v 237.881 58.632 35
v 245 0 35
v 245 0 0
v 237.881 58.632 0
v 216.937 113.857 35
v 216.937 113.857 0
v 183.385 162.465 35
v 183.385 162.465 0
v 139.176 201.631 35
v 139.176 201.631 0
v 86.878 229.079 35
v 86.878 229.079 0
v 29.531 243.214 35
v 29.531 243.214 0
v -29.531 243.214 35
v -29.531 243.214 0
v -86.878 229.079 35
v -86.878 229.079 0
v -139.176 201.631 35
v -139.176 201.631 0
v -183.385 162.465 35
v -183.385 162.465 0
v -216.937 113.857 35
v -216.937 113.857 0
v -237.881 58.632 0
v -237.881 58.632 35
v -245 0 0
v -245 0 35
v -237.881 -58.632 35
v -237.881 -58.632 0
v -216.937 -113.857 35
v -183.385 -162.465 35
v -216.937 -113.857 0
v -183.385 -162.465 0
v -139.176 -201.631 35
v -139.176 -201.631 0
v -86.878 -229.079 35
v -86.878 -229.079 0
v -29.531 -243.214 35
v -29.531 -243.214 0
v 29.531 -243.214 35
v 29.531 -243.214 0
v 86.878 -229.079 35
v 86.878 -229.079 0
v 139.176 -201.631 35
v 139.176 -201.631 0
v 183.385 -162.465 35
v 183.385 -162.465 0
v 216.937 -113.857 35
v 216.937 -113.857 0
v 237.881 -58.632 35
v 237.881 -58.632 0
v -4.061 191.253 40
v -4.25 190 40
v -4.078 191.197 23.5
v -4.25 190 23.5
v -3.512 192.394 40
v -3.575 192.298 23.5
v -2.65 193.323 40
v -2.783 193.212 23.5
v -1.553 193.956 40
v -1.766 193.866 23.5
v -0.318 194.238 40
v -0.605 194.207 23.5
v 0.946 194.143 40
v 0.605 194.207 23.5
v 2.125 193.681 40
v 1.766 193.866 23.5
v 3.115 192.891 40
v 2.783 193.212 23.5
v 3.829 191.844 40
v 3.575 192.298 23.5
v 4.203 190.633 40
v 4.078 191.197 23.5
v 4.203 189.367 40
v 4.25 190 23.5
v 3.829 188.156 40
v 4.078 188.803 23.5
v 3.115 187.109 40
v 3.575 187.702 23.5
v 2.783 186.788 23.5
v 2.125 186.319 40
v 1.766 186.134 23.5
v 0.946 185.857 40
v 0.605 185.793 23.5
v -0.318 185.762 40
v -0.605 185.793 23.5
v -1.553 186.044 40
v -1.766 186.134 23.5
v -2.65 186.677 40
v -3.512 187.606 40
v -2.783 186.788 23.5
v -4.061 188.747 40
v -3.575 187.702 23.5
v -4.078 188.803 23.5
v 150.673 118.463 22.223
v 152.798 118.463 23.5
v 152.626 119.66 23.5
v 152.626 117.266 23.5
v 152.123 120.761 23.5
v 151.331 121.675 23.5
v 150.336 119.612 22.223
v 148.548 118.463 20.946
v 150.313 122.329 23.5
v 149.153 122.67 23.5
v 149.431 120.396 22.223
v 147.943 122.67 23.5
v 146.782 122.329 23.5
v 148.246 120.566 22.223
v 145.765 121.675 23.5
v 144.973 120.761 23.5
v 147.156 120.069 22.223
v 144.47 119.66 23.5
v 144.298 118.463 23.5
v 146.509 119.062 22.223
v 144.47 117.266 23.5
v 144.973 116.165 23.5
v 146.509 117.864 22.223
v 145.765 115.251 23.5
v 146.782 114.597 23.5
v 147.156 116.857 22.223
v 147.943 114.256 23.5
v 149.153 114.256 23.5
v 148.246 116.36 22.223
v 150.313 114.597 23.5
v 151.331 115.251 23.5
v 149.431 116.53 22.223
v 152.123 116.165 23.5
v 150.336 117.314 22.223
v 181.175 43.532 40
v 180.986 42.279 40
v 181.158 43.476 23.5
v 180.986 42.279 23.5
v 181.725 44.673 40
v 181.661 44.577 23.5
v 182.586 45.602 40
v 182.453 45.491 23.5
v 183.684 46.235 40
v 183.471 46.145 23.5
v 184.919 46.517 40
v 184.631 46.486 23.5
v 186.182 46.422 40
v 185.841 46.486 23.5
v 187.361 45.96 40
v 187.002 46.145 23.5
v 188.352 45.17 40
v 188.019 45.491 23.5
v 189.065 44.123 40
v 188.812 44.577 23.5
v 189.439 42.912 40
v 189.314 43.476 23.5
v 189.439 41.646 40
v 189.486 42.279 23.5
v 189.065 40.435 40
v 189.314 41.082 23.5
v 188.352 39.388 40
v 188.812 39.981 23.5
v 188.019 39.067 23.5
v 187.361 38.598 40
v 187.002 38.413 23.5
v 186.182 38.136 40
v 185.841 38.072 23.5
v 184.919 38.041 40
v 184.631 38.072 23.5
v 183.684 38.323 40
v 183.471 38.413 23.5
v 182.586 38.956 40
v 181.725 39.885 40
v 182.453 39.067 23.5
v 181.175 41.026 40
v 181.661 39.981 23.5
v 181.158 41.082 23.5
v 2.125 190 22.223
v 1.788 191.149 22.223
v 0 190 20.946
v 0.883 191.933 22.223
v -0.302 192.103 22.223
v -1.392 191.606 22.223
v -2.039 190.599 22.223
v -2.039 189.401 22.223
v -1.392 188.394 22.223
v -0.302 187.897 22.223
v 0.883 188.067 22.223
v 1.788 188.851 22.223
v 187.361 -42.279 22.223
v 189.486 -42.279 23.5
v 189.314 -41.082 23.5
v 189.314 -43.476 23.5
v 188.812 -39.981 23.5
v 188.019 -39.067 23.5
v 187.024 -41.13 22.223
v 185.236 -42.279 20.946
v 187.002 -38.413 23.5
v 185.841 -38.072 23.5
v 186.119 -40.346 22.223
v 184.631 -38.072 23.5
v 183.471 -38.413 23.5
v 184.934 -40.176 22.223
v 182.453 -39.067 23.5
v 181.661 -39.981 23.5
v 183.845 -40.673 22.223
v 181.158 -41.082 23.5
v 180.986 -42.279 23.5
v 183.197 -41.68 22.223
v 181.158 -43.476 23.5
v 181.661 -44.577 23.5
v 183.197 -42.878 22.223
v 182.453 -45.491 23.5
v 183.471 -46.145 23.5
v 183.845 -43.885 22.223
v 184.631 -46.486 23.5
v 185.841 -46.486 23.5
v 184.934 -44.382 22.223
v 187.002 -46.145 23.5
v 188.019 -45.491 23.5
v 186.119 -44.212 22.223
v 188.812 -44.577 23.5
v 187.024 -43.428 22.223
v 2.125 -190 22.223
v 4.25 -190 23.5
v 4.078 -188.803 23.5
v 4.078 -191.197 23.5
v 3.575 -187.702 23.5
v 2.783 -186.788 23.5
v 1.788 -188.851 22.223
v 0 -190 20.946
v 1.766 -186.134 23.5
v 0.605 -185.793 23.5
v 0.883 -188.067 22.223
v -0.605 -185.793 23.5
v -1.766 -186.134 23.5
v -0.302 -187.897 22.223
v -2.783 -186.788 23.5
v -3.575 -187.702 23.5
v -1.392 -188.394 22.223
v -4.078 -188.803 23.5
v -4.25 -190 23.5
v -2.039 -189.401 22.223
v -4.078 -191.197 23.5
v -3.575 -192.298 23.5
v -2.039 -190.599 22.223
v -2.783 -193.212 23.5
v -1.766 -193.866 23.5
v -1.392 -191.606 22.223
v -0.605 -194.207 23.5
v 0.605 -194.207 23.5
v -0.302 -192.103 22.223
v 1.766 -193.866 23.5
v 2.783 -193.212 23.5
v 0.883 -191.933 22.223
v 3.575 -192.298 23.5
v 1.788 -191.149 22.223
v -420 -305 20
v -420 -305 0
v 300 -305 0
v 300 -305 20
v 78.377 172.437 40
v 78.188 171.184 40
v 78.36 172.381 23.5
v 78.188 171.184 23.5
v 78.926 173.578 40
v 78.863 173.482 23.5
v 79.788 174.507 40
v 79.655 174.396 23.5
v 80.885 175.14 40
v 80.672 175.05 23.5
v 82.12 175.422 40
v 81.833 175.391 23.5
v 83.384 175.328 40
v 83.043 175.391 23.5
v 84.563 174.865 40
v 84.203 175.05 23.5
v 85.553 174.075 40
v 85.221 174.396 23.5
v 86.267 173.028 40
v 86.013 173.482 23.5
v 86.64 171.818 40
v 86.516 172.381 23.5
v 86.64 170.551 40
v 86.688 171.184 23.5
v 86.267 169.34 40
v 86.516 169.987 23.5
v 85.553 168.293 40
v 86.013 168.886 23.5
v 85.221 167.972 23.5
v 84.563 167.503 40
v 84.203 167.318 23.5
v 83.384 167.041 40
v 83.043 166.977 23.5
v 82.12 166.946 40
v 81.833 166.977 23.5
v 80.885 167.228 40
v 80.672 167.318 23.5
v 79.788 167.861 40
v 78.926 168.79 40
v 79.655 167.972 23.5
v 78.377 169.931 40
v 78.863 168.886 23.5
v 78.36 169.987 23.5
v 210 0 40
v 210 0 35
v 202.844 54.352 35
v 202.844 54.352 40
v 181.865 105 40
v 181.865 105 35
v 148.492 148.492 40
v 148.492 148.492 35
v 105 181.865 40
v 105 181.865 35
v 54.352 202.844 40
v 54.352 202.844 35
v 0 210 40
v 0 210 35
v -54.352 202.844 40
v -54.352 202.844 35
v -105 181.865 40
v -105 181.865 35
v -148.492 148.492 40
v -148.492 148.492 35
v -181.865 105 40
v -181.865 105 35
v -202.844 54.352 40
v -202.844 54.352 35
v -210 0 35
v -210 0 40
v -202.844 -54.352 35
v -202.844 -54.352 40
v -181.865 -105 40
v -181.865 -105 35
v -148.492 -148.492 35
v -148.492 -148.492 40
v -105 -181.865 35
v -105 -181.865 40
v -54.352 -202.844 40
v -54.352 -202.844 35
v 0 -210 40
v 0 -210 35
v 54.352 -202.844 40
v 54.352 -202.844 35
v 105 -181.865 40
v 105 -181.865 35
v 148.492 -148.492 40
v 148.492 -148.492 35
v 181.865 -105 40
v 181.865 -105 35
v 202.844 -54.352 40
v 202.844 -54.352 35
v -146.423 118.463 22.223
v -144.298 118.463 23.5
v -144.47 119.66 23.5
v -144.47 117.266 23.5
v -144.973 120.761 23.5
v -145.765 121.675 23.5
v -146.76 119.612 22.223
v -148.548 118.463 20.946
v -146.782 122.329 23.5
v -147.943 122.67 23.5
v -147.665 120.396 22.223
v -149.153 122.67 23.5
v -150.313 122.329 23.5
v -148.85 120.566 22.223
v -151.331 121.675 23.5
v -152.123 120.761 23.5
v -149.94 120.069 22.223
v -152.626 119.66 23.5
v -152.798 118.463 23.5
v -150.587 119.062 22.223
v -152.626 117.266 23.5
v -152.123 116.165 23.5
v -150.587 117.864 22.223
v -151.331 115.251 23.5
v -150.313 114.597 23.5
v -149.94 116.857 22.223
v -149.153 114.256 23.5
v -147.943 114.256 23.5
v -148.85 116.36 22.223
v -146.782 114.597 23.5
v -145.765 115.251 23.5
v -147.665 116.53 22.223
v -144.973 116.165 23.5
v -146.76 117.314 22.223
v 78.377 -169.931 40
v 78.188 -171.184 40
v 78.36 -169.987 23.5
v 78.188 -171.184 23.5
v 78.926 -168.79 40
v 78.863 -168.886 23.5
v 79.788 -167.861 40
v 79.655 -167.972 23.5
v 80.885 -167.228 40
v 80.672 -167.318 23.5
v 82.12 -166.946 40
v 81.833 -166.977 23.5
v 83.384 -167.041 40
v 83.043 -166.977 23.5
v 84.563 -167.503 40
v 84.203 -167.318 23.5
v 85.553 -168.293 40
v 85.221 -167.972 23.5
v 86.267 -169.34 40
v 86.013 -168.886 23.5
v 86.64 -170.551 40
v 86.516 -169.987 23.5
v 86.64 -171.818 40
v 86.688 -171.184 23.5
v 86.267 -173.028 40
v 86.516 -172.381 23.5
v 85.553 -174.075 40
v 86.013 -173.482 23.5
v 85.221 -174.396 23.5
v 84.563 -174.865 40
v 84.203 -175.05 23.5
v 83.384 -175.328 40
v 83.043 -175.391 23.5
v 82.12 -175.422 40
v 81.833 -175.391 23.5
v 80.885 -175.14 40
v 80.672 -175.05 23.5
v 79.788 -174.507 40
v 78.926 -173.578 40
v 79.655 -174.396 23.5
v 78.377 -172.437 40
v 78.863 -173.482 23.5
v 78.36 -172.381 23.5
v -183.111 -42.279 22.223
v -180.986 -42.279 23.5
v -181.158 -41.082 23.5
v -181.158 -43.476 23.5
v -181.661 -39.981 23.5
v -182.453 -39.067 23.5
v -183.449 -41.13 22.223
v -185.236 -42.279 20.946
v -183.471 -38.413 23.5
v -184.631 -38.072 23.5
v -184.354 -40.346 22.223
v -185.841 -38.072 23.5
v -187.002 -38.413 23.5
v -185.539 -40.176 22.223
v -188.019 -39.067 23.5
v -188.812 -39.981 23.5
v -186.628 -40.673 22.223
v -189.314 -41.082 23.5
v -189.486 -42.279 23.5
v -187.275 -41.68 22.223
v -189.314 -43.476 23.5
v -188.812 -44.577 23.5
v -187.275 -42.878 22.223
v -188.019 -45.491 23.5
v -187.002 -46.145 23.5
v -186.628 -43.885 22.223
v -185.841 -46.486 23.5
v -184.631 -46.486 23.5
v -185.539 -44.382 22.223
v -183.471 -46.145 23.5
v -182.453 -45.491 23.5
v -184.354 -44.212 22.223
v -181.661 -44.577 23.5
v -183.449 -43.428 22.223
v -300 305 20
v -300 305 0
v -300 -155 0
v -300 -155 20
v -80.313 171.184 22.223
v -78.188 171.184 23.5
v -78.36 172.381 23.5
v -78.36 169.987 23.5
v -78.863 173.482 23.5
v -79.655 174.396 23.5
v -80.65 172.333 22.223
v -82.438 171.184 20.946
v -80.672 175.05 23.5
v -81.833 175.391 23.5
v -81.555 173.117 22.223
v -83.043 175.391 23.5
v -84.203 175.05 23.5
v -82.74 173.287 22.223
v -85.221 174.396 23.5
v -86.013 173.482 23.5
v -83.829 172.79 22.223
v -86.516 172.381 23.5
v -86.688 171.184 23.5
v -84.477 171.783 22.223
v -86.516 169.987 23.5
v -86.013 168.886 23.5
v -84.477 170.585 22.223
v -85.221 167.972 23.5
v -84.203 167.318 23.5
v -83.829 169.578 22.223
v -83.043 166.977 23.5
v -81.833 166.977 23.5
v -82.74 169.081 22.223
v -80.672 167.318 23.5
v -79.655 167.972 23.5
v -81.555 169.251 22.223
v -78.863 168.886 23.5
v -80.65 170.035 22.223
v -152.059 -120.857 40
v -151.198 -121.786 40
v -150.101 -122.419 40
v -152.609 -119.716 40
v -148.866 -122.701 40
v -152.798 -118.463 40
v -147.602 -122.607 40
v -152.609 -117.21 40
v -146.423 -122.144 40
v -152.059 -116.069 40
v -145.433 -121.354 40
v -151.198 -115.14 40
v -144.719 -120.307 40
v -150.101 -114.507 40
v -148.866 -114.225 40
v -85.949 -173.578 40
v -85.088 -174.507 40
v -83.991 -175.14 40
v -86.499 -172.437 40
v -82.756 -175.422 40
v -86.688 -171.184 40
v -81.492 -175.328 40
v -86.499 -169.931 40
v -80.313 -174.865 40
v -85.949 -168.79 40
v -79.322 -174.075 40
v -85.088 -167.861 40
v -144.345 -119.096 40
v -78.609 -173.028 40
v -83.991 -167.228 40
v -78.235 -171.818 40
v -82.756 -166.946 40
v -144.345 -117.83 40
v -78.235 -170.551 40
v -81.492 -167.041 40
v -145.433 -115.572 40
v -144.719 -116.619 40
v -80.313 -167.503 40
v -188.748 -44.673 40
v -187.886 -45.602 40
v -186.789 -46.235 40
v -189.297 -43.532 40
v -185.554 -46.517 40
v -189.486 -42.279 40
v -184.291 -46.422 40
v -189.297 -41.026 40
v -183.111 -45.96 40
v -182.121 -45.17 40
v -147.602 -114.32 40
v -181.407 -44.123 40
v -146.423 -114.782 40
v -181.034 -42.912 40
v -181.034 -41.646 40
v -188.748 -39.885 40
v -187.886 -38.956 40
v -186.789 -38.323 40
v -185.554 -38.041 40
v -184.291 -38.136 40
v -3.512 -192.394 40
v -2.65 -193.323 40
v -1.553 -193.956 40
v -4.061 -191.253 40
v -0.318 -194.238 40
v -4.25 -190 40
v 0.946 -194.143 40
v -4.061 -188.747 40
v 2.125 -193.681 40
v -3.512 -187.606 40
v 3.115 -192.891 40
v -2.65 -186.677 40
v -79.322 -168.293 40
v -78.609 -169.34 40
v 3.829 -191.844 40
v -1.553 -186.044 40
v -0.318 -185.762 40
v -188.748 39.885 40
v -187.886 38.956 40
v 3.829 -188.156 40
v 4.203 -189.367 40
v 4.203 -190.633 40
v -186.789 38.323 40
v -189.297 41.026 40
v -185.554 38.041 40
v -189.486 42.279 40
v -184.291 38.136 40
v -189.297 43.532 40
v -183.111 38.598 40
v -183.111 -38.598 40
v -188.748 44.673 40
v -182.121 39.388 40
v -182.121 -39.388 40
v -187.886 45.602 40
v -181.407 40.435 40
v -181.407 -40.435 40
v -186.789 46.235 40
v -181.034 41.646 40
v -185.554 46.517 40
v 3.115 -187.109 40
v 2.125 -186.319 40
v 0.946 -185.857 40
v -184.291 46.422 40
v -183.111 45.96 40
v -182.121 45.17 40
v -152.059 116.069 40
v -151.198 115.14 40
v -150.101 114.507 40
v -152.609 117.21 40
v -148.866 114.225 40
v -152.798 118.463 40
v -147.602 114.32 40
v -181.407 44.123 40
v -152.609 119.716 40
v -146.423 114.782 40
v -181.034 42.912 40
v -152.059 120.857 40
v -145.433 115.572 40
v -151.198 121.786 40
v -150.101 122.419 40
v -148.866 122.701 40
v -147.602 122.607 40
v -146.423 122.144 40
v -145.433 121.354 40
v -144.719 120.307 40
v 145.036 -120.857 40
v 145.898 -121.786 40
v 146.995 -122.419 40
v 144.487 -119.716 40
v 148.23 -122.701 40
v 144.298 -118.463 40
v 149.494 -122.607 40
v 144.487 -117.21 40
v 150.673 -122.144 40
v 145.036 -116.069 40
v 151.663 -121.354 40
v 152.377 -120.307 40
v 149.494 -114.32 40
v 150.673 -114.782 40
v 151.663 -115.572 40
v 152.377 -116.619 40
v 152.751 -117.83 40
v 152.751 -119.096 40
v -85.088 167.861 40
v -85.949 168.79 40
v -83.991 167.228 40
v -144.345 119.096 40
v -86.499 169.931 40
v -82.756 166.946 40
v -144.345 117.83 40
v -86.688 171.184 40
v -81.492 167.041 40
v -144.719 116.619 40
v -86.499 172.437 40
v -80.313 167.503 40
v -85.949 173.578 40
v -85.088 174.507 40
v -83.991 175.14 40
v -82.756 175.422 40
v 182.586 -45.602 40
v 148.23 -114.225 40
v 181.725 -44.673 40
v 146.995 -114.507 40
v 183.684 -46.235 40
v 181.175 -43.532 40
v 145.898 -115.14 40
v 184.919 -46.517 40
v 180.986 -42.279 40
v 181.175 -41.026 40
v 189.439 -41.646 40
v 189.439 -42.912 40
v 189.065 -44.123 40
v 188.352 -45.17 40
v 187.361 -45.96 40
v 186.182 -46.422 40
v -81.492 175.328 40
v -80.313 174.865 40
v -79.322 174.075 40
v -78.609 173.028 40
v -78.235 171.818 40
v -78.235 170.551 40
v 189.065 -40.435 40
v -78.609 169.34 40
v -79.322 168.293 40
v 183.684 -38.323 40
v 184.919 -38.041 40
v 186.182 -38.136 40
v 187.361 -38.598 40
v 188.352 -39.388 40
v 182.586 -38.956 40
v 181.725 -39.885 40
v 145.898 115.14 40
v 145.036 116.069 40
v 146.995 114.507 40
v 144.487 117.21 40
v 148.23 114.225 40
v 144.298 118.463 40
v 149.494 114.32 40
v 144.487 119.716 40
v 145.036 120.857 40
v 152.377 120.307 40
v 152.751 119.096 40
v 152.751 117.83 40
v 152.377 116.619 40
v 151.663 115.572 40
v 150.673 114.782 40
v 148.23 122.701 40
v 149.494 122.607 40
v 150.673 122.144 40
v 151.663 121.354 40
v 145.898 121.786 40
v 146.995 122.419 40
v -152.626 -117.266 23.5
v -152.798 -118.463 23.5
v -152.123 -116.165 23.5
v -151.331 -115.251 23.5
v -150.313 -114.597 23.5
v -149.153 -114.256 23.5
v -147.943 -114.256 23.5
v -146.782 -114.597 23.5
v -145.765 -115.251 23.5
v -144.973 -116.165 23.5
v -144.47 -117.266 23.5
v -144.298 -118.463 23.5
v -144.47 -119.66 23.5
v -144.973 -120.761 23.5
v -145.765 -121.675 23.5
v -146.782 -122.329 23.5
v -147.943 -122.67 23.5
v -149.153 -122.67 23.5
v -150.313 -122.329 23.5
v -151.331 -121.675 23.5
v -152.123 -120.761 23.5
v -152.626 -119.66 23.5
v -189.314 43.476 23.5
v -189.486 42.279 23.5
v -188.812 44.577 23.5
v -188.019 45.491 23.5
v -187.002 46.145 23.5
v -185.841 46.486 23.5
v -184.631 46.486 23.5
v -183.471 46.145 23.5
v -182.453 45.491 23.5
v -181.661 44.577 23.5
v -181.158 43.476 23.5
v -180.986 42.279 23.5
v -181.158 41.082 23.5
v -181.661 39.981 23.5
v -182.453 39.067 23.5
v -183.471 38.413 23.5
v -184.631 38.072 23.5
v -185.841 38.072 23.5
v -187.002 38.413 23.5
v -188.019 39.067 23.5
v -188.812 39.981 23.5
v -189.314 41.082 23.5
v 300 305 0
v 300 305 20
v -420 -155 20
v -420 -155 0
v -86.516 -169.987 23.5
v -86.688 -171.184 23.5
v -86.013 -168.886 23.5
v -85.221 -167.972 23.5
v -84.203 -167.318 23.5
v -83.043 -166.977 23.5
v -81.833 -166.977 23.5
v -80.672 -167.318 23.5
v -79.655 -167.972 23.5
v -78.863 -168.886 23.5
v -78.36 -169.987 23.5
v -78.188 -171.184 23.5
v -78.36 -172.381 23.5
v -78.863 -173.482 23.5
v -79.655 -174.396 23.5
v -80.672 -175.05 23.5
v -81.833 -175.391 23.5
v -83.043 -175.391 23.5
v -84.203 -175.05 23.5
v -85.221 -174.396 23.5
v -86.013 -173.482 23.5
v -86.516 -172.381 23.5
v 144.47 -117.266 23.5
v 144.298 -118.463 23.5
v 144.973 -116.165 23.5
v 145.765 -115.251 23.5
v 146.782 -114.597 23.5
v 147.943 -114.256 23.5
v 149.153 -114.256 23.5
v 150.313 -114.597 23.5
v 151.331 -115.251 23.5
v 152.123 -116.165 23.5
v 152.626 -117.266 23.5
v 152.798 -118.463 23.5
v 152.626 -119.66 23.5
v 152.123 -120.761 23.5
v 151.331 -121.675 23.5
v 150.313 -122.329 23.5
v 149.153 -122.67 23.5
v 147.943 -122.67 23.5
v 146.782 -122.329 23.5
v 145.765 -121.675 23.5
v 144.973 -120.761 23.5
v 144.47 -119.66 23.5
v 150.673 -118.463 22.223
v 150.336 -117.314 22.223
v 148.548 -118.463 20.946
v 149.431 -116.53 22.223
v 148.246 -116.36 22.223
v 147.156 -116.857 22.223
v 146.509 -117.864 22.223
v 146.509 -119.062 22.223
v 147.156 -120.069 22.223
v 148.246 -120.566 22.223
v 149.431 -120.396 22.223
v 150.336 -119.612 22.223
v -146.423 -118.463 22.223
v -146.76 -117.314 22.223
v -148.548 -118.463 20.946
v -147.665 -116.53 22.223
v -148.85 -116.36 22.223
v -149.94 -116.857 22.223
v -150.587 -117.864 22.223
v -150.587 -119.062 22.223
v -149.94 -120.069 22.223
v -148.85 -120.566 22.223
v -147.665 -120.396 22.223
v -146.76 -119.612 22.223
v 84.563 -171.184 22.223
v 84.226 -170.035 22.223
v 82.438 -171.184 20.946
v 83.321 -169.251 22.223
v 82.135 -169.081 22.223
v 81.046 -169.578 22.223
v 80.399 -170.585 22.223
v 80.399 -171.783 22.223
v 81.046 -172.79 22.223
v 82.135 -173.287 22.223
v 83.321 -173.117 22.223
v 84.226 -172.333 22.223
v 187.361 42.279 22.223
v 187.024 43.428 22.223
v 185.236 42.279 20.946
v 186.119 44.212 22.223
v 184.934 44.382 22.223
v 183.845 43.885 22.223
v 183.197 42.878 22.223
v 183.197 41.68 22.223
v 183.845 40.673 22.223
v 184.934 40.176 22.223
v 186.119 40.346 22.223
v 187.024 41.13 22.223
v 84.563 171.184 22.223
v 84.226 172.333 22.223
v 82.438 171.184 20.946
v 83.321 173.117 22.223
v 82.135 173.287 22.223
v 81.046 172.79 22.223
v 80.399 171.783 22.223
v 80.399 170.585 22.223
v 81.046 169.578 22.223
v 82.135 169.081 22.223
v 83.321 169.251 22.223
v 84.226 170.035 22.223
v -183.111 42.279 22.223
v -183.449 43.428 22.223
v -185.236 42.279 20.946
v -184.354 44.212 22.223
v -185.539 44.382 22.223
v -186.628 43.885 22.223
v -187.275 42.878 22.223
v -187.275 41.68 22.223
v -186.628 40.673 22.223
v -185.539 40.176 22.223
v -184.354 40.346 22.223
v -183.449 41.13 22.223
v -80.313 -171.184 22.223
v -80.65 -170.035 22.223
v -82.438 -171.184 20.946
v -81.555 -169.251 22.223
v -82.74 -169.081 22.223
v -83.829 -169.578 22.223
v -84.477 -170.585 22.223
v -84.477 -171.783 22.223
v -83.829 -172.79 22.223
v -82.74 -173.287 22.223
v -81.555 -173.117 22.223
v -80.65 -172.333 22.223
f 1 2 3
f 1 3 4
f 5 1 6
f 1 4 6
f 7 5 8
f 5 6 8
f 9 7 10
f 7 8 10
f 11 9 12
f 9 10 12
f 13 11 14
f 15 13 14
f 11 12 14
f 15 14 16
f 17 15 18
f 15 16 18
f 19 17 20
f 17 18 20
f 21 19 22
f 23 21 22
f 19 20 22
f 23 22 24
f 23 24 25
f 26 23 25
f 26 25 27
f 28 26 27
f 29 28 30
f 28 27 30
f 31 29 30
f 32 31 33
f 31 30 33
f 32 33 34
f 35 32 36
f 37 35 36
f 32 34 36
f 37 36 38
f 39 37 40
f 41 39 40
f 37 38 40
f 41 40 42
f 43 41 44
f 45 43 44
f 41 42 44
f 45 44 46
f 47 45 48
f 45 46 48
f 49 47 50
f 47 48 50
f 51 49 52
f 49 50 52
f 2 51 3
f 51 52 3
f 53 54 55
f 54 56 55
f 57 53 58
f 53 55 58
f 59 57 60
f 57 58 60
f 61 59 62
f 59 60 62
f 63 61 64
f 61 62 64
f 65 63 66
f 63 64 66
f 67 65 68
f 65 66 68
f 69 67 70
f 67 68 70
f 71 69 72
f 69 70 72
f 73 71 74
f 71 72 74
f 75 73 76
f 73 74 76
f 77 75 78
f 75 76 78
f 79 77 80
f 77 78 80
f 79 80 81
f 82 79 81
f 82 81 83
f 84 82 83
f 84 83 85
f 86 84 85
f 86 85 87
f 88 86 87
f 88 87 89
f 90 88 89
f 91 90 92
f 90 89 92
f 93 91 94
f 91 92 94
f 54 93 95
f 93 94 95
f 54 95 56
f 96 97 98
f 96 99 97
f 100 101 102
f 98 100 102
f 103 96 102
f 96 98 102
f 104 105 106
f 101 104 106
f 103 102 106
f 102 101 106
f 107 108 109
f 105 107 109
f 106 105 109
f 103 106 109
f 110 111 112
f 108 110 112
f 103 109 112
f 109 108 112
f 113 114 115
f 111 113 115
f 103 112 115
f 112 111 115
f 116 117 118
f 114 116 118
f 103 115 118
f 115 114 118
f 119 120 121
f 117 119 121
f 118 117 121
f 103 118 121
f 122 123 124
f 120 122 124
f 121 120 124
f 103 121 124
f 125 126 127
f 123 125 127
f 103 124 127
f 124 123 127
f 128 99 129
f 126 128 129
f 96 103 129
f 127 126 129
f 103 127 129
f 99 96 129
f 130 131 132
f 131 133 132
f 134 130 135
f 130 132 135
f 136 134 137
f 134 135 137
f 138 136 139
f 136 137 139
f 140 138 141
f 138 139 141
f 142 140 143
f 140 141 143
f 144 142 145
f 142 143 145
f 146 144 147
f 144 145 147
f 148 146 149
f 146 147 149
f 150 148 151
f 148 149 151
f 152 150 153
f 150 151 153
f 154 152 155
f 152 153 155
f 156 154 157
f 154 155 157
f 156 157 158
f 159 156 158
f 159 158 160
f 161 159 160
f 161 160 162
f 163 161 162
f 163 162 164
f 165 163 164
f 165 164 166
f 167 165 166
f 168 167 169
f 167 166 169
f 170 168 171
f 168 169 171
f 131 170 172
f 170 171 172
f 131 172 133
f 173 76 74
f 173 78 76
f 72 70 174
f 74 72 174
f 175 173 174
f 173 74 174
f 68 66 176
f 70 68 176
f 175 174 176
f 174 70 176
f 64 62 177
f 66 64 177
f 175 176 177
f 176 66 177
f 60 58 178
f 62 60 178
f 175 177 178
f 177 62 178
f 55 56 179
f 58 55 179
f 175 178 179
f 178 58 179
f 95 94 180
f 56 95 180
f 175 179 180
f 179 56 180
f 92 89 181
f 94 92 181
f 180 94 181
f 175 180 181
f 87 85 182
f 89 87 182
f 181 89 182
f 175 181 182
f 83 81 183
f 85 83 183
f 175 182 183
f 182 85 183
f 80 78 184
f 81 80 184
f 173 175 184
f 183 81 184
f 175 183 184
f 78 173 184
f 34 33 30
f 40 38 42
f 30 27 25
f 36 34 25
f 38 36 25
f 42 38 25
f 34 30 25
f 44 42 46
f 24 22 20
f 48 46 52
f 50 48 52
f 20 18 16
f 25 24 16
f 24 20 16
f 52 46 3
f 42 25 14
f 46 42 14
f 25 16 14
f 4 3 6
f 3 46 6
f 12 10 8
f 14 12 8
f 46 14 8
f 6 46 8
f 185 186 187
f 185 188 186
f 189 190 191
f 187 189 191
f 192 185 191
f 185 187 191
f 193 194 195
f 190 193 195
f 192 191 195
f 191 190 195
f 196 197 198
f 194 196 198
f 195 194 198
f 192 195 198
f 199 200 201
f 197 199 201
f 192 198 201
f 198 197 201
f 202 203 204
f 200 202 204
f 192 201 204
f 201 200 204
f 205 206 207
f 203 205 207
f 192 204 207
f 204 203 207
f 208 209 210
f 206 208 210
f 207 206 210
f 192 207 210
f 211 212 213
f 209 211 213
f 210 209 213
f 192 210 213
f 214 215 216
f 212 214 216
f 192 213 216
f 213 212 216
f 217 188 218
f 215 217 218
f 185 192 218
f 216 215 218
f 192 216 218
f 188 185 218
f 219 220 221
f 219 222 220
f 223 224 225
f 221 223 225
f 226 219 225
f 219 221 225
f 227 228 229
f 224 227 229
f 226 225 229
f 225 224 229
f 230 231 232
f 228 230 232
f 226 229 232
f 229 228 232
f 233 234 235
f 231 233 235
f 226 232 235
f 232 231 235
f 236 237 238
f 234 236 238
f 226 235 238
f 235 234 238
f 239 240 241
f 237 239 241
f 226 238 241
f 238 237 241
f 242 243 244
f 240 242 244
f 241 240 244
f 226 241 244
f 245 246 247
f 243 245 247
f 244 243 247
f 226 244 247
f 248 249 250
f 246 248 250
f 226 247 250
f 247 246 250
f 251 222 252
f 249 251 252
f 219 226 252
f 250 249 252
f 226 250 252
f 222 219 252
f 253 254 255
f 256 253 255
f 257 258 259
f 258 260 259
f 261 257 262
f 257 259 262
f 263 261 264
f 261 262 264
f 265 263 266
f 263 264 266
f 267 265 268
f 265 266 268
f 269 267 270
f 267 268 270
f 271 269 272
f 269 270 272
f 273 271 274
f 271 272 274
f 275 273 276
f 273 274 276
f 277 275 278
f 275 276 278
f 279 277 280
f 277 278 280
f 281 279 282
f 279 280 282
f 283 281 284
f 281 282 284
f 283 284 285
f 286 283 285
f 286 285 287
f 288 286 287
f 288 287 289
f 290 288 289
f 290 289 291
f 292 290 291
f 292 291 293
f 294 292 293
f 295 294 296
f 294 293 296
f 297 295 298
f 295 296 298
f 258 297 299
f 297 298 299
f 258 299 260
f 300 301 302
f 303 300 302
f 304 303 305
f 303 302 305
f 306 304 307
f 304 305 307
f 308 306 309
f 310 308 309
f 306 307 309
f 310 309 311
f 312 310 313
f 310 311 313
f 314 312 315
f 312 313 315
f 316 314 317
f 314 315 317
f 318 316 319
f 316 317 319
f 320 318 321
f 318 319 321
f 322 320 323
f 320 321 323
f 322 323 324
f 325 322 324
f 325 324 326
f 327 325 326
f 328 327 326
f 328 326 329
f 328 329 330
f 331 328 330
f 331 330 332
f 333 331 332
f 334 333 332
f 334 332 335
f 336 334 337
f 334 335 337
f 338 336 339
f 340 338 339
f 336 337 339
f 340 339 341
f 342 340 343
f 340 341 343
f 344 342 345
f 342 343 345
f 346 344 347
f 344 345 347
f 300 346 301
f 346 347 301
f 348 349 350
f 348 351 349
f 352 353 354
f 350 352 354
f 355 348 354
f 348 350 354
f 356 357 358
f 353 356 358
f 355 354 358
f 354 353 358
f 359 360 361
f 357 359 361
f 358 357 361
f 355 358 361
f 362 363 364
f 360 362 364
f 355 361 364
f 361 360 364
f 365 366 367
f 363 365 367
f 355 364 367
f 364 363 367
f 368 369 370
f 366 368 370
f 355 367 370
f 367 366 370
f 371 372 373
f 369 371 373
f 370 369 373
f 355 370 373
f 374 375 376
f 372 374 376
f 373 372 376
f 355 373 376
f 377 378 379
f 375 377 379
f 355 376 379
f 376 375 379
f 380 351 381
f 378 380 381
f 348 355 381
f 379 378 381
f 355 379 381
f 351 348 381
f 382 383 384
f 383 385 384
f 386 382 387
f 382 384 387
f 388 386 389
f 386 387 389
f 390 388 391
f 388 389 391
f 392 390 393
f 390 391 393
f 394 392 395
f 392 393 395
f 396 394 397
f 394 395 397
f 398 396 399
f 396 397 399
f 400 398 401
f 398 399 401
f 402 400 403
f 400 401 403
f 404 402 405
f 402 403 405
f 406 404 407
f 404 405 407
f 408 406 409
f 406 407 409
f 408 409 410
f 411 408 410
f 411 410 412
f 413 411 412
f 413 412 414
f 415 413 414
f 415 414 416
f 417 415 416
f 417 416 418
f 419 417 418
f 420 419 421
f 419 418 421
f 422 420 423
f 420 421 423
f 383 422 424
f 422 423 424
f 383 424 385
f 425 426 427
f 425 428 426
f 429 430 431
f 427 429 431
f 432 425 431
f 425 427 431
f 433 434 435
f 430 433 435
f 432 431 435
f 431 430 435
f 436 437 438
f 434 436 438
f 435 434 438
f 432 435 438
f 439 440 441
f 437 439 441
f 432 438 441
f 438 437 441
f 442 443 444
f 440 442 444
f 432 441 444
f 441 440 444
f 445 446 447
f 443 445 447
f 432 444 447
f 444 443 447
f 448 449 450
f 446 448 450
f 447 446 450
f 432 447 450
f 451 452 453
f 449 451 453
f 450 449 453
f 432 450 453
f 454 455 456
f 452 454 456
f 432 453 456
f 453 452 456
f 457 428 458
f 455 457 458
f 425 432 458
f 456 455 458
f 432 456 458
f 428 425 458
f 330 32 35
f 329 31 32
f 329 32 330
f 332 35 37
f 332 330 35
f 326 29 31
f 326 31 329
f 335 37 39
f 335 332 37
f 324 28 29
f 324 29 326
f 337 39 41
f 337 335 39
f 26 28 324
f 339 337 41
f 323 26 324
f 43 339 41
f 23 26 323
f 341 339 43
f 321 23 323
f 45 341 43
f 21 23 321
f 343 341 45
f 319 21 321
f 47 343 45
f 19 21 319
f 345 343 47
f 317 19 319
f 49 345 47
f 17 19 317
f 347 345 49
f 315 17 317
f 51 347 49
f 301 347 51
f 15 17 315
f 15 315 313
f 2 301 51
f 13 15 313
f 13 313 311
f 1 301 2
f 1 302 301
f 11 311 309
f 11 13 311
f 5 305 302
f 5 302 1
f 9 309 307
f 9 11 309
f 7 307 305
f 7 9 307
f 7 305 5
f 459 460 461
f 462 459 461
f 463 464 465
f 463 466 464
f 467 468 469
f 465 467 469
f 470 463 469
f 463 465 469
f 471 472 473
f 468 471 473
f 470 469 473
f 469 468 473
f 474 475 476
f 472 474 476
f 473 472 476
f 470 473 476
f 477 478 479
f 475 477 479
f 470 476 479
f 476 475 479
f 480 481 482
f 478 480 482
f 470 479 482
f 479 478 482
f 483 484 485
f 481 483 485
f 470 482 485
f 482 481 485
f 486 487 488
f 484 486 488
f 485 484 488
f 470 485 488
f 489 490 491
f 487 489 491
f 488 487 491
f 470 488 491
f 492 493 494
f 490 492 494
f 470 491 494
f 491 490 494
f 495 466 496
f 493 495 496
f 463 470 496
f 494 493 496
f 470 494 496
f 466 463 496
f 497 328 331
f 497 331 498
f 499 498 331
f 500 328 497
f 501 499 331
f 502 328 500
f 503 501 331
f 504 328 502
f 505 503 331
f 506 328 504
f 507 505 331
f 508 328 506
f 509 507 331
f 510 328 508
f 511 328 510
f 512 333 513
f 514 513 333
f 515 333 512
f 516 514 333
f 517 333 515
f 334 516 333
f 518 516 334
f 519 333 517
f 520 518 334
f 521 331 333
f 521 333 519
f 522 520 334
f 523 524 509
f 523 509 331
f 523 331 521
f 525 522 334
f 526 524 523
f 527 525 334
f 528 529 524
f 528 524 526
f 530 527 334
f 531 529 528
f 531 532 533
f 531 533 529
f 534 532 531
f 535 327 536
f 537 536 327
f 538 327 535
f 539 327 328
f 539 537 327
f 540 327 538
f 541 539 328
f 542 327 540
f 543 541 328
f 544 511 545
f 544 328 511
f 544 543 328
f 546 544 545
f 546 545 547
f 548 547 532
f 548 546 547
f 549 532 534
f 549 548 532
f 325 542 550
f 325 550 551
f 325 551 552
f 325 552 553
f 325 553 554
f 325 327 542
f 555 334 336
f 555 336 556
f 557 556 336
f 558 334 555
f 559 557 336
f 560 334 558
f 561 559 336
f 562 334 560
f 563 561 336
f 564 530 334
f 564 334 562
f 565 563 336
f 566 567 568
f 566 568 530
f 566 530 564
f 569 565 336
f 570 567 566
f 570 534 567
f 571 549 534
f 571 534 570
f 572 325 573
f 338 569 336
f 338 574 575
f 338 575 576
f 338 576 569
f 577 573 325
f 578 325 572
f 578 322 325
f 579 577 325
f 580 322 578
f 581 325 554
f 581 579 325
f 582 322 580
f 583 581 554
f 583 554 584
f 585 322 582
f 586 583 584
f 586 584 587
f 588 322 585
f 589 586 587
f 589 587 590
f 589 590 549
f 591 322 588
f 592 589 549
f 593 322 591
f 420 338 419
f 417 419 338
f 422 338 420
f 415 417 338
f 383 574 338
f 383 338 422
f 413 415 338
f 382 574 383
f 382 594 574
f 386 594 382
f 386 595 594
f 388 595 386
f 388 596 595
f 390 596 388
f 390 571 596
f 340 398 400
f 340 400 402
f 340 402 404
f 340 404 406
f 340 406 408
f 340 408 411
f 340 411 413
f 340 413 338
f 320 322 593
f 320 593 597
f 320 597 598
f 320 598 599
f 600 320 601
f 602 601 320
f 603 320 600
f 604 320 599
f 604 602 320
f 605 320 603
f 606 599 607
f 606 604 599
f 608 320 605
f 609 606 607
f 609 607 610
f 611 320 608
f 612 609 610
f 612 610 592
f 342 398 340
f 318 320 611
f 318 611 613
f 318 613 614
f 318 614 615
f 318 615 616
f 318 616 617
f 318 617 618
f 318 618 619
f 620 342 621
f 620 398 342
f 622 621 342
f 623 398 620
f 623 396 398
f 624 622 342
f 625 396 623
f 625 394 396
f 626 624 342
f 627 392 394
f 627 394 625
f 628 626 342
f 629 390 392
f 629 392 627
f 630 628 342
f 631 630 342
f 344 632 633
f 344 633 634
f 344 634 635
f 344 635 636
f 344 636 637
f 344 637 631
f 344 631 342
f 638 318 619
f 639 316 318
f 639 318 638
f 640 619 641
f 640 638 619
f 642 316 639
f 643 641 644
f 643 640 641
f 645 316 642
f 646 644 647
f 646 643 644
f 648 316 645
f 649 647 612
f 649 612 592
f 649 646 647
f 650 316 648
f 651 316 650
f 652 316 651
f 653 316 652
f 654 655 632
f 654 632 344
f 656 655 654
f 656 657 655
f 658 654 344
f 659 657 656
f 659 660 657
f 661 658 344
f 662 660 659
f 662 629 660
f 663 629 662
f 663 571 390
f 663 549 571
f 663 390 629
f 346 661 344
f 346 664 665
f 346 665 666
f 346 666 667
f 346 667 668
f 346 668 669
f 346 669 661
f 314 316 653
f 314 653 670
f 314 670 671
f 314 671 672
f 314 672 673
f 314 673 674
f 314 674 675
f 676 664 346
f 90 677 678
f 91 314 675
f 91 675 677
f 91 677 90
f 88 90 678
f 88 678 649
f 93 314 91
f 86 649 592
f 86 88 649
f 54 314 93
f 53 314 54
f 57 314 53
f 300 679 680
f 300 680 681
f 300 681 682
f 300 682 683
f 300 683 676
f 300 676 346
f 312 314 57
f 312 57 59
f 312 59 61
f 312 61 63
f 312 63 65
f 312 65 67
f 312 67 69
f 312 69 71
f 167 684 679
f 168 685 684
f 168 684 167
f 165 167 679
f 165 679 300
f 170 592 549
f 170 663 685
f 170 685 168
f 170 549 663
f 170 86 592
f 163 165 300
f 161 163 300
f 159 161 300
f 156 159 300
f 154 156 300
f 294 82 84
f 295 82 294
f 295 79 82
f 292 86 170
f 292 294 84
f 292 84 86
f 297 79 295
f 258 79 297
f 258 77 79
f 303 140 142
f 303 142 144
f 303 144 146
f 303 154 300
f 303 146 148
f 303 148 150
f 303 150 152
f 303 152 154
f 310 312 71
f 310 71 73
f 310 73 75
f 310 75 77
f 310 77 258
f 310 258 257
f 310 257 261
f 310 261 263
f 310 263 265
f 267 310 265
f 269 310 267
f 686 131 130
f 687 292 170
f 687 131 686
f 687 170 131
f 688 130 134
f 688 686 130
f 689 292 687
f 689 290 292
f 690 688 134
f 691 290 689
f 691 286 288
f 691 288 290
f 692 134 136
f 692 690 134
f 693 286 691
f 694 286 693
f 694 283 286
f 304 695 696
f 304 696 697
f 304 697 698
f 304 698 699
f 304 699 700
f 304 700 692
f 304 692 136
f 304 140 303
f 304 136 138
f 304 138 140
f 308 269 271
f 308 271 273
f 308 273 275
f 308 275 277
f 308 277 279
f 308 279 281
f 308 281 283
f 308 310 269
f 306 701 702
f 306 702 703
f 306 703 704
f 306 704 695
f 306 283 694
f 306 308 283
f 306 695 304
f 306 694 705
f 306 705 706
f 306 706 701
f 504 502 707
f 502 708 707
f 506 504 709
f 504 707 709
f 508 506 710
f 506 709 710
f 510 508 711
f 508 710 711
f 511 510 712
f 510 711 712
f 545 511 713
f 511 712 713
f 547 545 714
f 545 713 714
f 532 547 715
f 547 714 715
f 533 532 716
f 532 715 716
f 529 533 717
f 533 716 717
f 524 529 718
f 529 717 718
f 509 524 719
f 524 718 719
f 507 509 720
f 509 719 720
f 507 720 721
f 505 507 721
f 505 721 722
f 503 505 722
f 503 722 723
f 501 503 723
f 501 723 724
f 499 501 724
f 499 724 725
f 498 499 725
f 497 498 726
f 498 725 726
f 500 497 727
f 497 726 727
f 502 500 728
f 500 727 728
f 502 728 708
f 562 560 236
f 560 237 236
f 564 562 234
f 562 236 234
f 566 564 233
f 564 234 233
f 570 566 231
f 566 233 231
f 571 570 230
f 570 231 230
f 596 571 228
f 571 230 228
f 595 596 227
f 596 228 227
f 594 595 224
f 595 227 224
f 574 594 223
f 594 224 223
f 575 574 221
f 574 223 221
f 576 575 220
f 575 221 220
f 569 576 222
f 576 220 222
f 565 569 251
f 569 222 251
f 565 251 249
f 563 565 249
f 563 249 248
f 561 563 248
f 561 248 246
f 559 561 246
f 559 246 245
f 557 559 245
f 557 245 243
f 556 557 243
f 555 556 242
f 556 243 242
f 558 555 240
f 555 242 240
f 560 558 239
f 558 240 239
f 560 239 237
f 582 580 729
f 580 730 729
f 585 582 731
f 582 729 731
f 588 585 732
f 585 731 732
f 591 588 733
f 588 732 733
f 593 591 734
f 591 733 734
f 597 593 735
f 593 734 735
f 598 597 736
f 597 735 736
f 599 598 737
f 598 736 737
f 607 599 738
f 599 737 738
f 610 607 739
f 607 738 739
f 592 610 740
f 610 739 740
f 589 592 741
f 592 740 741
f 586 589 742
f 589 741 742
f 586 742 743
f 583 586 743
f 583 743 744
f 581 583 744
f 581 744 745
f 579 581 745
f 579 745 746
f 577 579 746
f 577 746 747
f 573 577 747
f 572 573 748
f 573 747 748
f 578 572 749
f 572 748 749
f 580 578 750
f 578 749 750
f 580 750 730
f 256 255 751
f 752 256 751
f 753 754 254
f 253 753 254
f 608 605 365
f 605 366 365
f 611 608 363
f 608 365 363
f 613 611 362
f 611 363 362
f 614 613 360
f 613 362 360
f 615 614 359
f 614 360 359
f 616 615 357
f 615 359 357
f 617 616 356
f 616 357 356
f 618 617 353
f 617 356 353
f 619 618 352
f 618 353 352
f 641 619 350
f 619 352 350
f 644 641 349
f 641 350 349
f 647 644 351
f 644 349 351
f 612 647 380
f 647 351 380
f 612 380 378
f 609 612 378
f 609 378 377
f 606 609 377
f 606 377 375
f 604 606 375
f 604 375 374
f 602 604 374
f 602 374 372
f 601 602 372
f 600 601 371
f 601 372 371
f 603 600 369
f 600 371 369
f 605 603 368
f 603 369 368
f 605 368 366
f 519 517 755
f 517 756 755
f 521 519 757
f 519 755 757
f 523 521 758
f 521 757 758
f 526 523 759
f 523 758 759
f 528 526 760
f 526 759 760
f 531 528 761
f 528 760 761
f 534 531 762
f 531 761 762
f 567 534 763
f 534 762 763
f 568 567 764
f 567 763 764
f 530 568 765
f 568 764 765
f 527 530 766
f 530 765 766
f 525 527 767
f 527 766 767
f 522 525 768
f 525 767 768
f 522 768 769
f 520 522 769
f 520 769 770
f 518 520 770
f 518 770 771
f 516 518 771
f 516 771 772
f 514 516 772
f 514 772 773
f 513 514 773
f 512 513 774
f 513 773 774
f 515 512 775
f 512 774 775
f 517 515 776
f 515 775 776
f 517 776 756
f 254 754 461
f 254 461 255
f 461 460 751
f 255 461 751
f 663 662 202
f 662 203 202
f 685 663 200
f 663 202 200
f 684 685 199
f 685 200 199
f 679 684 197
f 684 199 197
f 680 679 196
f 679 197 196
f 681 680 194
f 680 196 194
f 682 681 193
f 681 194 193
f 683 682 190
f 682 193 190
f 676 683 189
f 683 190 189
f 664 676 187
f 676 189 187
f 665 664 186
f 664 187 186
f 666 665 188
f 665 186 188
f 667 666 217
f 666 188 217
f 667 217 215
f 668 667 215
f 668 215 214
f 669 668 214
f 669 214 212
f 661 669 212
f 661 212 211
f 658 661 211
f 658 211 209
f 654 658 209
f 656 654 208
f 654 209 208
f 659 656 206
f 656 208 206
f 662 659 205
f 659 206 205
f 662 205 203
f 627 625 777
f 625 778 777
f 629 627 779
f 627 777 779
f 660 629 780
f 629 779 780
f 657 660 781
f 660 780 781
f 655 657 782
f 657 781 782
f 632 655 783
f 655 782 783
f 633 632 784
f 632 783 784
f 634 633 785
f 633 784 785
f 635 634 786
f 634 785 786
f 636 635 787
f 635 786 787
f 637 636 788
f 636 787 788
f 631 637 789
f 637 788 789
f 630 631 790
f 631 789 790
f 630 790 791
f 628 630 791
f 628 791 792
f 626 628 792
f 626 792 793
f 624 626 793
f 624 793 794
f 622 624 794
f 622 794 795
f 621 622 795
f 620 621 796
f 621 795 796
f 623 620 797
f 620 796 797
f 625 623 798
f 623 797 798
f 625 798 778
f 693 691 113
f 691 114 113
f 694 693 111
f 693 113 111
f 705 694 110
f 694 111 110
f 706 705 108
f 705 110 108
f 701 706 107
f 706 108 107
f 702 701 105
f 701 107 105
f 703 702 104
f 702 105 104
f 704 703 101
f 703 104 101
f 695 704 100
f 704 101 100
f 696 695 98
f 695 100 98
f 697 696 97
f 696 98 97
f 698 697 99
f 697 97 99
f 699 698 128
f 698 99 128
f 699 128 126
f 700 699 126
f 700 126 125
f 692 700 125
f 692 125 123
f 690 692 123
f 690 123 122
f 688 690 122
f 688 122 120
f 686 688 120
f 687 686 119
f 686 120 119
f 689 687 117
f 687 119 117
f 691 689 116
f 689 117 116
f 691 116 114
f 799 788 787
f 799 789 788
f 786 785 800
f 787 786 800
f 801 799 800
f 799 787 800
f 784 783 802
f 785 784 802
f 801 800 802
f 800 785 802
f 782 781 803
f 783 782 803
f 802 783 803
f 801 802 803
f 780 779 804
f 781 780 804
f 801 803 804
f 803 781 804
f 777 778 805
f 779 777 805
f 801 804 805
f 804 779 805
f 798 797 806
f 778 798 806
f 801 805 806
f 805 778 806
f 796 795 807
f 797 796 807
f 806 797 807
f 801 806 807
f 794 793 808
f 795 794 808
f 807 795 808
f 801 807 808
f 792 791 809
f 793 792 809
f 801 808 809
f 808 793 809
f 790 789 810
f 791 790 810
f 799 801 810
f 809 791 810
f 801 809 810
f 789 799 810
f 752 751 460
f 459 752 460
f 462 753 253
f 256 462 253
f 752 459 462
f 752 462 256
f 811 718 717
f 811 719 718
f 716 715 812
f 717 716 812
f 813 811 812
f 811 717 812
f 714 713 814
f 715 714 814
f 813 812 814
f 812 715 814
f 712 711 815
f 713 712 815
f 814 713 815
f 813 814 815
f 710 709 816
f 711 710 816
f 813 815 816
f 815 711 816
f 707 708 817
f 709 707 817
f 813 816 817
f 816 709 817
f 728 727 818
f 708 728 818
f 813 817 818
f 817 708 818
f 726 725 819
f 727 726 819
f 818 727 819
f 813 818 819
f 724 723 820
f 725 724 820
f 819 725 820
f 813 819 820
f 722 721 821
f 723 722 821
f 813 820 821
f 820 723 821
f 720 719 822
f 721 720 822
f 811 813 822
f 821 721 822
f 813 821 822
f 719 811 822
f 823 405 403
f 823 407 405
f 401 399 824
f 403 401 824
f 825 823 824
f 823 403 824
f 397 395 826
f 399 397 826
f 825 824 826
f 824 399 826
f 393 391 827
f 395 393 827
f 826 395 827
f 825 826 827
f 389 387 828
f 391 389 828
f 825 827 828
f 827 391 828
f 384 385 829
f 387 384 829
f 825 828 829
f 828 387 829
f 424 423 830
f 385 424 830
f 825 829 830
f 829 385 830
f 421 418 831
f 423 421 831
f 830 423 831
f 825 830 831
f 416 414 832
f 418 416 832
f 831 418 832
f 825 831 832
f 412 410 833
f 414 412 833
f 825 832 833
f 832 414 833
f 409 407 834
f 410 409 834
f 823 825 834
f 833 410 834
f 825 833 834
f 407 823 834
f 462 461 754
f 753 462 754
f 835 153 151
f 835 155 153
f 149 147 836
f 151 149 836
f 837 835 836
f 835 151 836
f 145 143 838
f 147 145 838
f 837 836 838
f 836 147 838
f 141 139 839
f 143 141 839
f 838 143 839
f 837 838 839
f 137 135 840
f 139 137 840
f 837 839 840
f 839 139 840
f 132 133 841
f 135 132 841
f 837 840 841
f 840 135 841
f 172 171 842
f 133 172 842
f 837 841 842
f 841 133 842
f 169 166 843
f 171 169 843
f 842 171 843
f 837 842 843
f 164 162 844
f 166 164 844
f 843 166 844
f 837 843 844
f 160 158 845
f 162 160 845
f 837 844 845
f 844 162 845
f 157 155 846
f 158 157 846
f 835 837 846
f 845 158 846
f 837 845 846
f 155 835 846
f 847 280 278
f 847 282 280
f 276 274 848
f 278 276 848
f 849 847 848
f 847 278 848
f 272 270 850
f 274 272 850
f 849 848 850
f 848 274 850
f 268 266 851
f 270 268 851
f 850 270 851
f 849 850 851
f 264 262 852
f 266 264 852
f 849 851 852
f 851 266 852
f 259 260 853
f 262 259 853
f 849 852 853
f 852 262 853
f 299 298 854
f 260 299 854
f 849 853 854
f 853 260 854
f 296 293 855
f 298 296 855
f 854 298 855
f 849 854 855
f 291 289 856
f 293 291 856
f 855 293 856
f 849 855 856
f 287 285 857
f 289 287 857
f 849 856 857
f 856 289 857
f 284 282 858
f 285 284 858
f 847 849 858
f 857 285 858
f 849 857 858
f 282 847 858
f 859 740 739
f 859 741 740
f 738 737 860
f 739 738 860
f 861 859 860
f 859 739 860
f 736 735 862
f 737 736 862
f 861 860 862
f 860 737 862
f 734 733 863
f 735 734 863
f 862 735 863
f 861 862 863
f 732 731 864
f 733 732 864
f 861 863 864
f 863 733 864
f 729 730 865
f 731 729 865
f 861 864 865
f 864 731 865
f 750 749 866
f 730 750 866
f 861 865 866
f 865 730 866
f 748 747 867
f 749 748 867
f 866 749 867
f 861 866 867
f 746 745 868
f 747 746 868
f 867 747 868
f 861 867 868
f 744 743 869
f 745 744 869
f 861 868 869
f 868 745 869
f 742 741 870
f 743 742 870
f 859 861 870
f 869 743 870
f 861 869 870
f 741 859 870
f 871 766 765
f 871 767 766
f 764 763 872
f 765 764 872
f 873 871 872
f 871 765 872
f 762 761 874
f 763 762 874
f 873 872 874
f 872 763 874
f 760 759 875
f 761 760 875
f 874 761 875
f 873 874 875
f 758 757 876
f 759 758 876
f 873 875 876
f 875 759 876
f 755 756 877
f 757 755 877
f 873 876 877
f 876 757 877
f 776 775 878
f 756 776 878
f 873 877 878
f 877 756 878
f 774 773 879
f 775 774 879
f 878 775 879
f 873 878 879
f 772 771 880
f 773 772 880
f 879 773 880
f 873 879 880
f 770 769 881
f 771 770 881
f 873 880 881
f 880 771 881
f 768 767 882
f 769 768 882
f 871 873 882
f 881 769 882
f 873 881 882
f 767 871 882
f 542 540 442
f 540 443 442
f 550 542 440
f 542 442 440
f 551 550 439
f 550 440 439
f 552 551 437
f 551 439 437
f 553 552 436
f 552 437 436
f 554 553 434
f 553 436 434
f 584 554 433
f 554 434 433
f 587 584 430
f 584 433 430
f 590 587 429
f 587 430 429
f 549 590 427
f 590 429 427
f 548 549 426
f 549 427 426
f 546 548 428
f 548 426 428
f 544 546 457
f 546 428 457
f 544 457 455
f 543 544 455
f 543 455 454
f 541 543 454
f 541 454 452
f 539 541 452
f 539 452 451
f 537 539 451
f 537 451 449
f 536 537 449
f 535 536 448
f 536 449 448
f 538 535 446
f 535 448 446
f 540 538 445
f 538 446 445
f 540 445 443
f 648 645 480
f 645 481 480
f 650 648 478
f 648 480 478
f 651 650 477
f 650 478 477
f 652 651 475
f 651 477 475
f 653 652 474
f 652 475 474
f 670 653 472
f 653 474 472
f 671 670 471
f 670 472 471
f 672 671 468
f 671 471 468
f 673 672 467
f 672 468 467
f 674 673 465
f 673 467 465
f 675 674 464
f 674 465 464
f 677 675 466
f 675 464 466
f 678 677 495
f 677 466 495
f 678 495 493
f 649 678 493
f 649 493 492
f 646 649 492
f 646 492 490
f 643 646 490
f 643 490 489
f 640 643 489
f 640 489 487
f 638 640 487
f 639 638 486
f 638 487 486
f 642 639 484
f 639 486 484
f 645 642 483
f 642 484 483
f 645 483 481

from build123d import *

# Parameters (mm, degrees)
F1_DEPTH = 20
F2_R     = 245
F3_DEPTH = 35
F4_R     = 210
F5_DEPTH = 5
F7_D     = 8.5
F7_DEPTH = 16.5
F7_TIP   = 2.5536576309


with BuildPart() as f1:
    # F0 (on Top) → F1 (new body)
    with BuildSketch(Plane.XY):
        Polygon((-300, -305), (300, -305), (300, 305), (-300, 305), (-300, -155), (-420, -155), (-420, -305), align=None)
    extrude(amount=F1_DEPTH)


with BuildPart() as f3:
    # F2 (on Top) → F3 (new body)
    with BuildSketch(Plane.XY):
        Circle(F2_R)
    extrude(amount=F3_DEPTH)

    # F4 (on face) → F5 (join)
    with BuildSketch(Plane.XY.offset(35)):
        Circle(F4_R)
    extrude(amount=F5_DEPTH)

    # F7
    with Locations(Plane.XY.offset(40)):
        with Locations((0, 190), (82.4379104323, 171.1840849015), (148.5479816689, 118.4630623532), (185.2363033145, 42.2789774517), (185.2363033145, -42.2789774517), (148.5479816689, -118.4630623532), (82.4379104323, -171.1840849015), (0, -190), (-82.4379104323, -171.1840849015), (-148.5479816689, -118.4630623532), (-185.2363033145, -42.2789774517), (-185.2363033145, 42.2789774517), (-148.5479816689, 118.4630623532), (-82.4379104323, 171.1840849015)):
            Hole(F7_D / 2, depth=F7_DEPTH)
            with Locations((0, 0, -(F7_DEPTH + F7_TIP / 2))):  # 118° drill point
                Cone(0, F7_D / 2, F7_TIP, mode=Mode.SUBTRACT)


solid = Compound([f1.part, f3.part])
